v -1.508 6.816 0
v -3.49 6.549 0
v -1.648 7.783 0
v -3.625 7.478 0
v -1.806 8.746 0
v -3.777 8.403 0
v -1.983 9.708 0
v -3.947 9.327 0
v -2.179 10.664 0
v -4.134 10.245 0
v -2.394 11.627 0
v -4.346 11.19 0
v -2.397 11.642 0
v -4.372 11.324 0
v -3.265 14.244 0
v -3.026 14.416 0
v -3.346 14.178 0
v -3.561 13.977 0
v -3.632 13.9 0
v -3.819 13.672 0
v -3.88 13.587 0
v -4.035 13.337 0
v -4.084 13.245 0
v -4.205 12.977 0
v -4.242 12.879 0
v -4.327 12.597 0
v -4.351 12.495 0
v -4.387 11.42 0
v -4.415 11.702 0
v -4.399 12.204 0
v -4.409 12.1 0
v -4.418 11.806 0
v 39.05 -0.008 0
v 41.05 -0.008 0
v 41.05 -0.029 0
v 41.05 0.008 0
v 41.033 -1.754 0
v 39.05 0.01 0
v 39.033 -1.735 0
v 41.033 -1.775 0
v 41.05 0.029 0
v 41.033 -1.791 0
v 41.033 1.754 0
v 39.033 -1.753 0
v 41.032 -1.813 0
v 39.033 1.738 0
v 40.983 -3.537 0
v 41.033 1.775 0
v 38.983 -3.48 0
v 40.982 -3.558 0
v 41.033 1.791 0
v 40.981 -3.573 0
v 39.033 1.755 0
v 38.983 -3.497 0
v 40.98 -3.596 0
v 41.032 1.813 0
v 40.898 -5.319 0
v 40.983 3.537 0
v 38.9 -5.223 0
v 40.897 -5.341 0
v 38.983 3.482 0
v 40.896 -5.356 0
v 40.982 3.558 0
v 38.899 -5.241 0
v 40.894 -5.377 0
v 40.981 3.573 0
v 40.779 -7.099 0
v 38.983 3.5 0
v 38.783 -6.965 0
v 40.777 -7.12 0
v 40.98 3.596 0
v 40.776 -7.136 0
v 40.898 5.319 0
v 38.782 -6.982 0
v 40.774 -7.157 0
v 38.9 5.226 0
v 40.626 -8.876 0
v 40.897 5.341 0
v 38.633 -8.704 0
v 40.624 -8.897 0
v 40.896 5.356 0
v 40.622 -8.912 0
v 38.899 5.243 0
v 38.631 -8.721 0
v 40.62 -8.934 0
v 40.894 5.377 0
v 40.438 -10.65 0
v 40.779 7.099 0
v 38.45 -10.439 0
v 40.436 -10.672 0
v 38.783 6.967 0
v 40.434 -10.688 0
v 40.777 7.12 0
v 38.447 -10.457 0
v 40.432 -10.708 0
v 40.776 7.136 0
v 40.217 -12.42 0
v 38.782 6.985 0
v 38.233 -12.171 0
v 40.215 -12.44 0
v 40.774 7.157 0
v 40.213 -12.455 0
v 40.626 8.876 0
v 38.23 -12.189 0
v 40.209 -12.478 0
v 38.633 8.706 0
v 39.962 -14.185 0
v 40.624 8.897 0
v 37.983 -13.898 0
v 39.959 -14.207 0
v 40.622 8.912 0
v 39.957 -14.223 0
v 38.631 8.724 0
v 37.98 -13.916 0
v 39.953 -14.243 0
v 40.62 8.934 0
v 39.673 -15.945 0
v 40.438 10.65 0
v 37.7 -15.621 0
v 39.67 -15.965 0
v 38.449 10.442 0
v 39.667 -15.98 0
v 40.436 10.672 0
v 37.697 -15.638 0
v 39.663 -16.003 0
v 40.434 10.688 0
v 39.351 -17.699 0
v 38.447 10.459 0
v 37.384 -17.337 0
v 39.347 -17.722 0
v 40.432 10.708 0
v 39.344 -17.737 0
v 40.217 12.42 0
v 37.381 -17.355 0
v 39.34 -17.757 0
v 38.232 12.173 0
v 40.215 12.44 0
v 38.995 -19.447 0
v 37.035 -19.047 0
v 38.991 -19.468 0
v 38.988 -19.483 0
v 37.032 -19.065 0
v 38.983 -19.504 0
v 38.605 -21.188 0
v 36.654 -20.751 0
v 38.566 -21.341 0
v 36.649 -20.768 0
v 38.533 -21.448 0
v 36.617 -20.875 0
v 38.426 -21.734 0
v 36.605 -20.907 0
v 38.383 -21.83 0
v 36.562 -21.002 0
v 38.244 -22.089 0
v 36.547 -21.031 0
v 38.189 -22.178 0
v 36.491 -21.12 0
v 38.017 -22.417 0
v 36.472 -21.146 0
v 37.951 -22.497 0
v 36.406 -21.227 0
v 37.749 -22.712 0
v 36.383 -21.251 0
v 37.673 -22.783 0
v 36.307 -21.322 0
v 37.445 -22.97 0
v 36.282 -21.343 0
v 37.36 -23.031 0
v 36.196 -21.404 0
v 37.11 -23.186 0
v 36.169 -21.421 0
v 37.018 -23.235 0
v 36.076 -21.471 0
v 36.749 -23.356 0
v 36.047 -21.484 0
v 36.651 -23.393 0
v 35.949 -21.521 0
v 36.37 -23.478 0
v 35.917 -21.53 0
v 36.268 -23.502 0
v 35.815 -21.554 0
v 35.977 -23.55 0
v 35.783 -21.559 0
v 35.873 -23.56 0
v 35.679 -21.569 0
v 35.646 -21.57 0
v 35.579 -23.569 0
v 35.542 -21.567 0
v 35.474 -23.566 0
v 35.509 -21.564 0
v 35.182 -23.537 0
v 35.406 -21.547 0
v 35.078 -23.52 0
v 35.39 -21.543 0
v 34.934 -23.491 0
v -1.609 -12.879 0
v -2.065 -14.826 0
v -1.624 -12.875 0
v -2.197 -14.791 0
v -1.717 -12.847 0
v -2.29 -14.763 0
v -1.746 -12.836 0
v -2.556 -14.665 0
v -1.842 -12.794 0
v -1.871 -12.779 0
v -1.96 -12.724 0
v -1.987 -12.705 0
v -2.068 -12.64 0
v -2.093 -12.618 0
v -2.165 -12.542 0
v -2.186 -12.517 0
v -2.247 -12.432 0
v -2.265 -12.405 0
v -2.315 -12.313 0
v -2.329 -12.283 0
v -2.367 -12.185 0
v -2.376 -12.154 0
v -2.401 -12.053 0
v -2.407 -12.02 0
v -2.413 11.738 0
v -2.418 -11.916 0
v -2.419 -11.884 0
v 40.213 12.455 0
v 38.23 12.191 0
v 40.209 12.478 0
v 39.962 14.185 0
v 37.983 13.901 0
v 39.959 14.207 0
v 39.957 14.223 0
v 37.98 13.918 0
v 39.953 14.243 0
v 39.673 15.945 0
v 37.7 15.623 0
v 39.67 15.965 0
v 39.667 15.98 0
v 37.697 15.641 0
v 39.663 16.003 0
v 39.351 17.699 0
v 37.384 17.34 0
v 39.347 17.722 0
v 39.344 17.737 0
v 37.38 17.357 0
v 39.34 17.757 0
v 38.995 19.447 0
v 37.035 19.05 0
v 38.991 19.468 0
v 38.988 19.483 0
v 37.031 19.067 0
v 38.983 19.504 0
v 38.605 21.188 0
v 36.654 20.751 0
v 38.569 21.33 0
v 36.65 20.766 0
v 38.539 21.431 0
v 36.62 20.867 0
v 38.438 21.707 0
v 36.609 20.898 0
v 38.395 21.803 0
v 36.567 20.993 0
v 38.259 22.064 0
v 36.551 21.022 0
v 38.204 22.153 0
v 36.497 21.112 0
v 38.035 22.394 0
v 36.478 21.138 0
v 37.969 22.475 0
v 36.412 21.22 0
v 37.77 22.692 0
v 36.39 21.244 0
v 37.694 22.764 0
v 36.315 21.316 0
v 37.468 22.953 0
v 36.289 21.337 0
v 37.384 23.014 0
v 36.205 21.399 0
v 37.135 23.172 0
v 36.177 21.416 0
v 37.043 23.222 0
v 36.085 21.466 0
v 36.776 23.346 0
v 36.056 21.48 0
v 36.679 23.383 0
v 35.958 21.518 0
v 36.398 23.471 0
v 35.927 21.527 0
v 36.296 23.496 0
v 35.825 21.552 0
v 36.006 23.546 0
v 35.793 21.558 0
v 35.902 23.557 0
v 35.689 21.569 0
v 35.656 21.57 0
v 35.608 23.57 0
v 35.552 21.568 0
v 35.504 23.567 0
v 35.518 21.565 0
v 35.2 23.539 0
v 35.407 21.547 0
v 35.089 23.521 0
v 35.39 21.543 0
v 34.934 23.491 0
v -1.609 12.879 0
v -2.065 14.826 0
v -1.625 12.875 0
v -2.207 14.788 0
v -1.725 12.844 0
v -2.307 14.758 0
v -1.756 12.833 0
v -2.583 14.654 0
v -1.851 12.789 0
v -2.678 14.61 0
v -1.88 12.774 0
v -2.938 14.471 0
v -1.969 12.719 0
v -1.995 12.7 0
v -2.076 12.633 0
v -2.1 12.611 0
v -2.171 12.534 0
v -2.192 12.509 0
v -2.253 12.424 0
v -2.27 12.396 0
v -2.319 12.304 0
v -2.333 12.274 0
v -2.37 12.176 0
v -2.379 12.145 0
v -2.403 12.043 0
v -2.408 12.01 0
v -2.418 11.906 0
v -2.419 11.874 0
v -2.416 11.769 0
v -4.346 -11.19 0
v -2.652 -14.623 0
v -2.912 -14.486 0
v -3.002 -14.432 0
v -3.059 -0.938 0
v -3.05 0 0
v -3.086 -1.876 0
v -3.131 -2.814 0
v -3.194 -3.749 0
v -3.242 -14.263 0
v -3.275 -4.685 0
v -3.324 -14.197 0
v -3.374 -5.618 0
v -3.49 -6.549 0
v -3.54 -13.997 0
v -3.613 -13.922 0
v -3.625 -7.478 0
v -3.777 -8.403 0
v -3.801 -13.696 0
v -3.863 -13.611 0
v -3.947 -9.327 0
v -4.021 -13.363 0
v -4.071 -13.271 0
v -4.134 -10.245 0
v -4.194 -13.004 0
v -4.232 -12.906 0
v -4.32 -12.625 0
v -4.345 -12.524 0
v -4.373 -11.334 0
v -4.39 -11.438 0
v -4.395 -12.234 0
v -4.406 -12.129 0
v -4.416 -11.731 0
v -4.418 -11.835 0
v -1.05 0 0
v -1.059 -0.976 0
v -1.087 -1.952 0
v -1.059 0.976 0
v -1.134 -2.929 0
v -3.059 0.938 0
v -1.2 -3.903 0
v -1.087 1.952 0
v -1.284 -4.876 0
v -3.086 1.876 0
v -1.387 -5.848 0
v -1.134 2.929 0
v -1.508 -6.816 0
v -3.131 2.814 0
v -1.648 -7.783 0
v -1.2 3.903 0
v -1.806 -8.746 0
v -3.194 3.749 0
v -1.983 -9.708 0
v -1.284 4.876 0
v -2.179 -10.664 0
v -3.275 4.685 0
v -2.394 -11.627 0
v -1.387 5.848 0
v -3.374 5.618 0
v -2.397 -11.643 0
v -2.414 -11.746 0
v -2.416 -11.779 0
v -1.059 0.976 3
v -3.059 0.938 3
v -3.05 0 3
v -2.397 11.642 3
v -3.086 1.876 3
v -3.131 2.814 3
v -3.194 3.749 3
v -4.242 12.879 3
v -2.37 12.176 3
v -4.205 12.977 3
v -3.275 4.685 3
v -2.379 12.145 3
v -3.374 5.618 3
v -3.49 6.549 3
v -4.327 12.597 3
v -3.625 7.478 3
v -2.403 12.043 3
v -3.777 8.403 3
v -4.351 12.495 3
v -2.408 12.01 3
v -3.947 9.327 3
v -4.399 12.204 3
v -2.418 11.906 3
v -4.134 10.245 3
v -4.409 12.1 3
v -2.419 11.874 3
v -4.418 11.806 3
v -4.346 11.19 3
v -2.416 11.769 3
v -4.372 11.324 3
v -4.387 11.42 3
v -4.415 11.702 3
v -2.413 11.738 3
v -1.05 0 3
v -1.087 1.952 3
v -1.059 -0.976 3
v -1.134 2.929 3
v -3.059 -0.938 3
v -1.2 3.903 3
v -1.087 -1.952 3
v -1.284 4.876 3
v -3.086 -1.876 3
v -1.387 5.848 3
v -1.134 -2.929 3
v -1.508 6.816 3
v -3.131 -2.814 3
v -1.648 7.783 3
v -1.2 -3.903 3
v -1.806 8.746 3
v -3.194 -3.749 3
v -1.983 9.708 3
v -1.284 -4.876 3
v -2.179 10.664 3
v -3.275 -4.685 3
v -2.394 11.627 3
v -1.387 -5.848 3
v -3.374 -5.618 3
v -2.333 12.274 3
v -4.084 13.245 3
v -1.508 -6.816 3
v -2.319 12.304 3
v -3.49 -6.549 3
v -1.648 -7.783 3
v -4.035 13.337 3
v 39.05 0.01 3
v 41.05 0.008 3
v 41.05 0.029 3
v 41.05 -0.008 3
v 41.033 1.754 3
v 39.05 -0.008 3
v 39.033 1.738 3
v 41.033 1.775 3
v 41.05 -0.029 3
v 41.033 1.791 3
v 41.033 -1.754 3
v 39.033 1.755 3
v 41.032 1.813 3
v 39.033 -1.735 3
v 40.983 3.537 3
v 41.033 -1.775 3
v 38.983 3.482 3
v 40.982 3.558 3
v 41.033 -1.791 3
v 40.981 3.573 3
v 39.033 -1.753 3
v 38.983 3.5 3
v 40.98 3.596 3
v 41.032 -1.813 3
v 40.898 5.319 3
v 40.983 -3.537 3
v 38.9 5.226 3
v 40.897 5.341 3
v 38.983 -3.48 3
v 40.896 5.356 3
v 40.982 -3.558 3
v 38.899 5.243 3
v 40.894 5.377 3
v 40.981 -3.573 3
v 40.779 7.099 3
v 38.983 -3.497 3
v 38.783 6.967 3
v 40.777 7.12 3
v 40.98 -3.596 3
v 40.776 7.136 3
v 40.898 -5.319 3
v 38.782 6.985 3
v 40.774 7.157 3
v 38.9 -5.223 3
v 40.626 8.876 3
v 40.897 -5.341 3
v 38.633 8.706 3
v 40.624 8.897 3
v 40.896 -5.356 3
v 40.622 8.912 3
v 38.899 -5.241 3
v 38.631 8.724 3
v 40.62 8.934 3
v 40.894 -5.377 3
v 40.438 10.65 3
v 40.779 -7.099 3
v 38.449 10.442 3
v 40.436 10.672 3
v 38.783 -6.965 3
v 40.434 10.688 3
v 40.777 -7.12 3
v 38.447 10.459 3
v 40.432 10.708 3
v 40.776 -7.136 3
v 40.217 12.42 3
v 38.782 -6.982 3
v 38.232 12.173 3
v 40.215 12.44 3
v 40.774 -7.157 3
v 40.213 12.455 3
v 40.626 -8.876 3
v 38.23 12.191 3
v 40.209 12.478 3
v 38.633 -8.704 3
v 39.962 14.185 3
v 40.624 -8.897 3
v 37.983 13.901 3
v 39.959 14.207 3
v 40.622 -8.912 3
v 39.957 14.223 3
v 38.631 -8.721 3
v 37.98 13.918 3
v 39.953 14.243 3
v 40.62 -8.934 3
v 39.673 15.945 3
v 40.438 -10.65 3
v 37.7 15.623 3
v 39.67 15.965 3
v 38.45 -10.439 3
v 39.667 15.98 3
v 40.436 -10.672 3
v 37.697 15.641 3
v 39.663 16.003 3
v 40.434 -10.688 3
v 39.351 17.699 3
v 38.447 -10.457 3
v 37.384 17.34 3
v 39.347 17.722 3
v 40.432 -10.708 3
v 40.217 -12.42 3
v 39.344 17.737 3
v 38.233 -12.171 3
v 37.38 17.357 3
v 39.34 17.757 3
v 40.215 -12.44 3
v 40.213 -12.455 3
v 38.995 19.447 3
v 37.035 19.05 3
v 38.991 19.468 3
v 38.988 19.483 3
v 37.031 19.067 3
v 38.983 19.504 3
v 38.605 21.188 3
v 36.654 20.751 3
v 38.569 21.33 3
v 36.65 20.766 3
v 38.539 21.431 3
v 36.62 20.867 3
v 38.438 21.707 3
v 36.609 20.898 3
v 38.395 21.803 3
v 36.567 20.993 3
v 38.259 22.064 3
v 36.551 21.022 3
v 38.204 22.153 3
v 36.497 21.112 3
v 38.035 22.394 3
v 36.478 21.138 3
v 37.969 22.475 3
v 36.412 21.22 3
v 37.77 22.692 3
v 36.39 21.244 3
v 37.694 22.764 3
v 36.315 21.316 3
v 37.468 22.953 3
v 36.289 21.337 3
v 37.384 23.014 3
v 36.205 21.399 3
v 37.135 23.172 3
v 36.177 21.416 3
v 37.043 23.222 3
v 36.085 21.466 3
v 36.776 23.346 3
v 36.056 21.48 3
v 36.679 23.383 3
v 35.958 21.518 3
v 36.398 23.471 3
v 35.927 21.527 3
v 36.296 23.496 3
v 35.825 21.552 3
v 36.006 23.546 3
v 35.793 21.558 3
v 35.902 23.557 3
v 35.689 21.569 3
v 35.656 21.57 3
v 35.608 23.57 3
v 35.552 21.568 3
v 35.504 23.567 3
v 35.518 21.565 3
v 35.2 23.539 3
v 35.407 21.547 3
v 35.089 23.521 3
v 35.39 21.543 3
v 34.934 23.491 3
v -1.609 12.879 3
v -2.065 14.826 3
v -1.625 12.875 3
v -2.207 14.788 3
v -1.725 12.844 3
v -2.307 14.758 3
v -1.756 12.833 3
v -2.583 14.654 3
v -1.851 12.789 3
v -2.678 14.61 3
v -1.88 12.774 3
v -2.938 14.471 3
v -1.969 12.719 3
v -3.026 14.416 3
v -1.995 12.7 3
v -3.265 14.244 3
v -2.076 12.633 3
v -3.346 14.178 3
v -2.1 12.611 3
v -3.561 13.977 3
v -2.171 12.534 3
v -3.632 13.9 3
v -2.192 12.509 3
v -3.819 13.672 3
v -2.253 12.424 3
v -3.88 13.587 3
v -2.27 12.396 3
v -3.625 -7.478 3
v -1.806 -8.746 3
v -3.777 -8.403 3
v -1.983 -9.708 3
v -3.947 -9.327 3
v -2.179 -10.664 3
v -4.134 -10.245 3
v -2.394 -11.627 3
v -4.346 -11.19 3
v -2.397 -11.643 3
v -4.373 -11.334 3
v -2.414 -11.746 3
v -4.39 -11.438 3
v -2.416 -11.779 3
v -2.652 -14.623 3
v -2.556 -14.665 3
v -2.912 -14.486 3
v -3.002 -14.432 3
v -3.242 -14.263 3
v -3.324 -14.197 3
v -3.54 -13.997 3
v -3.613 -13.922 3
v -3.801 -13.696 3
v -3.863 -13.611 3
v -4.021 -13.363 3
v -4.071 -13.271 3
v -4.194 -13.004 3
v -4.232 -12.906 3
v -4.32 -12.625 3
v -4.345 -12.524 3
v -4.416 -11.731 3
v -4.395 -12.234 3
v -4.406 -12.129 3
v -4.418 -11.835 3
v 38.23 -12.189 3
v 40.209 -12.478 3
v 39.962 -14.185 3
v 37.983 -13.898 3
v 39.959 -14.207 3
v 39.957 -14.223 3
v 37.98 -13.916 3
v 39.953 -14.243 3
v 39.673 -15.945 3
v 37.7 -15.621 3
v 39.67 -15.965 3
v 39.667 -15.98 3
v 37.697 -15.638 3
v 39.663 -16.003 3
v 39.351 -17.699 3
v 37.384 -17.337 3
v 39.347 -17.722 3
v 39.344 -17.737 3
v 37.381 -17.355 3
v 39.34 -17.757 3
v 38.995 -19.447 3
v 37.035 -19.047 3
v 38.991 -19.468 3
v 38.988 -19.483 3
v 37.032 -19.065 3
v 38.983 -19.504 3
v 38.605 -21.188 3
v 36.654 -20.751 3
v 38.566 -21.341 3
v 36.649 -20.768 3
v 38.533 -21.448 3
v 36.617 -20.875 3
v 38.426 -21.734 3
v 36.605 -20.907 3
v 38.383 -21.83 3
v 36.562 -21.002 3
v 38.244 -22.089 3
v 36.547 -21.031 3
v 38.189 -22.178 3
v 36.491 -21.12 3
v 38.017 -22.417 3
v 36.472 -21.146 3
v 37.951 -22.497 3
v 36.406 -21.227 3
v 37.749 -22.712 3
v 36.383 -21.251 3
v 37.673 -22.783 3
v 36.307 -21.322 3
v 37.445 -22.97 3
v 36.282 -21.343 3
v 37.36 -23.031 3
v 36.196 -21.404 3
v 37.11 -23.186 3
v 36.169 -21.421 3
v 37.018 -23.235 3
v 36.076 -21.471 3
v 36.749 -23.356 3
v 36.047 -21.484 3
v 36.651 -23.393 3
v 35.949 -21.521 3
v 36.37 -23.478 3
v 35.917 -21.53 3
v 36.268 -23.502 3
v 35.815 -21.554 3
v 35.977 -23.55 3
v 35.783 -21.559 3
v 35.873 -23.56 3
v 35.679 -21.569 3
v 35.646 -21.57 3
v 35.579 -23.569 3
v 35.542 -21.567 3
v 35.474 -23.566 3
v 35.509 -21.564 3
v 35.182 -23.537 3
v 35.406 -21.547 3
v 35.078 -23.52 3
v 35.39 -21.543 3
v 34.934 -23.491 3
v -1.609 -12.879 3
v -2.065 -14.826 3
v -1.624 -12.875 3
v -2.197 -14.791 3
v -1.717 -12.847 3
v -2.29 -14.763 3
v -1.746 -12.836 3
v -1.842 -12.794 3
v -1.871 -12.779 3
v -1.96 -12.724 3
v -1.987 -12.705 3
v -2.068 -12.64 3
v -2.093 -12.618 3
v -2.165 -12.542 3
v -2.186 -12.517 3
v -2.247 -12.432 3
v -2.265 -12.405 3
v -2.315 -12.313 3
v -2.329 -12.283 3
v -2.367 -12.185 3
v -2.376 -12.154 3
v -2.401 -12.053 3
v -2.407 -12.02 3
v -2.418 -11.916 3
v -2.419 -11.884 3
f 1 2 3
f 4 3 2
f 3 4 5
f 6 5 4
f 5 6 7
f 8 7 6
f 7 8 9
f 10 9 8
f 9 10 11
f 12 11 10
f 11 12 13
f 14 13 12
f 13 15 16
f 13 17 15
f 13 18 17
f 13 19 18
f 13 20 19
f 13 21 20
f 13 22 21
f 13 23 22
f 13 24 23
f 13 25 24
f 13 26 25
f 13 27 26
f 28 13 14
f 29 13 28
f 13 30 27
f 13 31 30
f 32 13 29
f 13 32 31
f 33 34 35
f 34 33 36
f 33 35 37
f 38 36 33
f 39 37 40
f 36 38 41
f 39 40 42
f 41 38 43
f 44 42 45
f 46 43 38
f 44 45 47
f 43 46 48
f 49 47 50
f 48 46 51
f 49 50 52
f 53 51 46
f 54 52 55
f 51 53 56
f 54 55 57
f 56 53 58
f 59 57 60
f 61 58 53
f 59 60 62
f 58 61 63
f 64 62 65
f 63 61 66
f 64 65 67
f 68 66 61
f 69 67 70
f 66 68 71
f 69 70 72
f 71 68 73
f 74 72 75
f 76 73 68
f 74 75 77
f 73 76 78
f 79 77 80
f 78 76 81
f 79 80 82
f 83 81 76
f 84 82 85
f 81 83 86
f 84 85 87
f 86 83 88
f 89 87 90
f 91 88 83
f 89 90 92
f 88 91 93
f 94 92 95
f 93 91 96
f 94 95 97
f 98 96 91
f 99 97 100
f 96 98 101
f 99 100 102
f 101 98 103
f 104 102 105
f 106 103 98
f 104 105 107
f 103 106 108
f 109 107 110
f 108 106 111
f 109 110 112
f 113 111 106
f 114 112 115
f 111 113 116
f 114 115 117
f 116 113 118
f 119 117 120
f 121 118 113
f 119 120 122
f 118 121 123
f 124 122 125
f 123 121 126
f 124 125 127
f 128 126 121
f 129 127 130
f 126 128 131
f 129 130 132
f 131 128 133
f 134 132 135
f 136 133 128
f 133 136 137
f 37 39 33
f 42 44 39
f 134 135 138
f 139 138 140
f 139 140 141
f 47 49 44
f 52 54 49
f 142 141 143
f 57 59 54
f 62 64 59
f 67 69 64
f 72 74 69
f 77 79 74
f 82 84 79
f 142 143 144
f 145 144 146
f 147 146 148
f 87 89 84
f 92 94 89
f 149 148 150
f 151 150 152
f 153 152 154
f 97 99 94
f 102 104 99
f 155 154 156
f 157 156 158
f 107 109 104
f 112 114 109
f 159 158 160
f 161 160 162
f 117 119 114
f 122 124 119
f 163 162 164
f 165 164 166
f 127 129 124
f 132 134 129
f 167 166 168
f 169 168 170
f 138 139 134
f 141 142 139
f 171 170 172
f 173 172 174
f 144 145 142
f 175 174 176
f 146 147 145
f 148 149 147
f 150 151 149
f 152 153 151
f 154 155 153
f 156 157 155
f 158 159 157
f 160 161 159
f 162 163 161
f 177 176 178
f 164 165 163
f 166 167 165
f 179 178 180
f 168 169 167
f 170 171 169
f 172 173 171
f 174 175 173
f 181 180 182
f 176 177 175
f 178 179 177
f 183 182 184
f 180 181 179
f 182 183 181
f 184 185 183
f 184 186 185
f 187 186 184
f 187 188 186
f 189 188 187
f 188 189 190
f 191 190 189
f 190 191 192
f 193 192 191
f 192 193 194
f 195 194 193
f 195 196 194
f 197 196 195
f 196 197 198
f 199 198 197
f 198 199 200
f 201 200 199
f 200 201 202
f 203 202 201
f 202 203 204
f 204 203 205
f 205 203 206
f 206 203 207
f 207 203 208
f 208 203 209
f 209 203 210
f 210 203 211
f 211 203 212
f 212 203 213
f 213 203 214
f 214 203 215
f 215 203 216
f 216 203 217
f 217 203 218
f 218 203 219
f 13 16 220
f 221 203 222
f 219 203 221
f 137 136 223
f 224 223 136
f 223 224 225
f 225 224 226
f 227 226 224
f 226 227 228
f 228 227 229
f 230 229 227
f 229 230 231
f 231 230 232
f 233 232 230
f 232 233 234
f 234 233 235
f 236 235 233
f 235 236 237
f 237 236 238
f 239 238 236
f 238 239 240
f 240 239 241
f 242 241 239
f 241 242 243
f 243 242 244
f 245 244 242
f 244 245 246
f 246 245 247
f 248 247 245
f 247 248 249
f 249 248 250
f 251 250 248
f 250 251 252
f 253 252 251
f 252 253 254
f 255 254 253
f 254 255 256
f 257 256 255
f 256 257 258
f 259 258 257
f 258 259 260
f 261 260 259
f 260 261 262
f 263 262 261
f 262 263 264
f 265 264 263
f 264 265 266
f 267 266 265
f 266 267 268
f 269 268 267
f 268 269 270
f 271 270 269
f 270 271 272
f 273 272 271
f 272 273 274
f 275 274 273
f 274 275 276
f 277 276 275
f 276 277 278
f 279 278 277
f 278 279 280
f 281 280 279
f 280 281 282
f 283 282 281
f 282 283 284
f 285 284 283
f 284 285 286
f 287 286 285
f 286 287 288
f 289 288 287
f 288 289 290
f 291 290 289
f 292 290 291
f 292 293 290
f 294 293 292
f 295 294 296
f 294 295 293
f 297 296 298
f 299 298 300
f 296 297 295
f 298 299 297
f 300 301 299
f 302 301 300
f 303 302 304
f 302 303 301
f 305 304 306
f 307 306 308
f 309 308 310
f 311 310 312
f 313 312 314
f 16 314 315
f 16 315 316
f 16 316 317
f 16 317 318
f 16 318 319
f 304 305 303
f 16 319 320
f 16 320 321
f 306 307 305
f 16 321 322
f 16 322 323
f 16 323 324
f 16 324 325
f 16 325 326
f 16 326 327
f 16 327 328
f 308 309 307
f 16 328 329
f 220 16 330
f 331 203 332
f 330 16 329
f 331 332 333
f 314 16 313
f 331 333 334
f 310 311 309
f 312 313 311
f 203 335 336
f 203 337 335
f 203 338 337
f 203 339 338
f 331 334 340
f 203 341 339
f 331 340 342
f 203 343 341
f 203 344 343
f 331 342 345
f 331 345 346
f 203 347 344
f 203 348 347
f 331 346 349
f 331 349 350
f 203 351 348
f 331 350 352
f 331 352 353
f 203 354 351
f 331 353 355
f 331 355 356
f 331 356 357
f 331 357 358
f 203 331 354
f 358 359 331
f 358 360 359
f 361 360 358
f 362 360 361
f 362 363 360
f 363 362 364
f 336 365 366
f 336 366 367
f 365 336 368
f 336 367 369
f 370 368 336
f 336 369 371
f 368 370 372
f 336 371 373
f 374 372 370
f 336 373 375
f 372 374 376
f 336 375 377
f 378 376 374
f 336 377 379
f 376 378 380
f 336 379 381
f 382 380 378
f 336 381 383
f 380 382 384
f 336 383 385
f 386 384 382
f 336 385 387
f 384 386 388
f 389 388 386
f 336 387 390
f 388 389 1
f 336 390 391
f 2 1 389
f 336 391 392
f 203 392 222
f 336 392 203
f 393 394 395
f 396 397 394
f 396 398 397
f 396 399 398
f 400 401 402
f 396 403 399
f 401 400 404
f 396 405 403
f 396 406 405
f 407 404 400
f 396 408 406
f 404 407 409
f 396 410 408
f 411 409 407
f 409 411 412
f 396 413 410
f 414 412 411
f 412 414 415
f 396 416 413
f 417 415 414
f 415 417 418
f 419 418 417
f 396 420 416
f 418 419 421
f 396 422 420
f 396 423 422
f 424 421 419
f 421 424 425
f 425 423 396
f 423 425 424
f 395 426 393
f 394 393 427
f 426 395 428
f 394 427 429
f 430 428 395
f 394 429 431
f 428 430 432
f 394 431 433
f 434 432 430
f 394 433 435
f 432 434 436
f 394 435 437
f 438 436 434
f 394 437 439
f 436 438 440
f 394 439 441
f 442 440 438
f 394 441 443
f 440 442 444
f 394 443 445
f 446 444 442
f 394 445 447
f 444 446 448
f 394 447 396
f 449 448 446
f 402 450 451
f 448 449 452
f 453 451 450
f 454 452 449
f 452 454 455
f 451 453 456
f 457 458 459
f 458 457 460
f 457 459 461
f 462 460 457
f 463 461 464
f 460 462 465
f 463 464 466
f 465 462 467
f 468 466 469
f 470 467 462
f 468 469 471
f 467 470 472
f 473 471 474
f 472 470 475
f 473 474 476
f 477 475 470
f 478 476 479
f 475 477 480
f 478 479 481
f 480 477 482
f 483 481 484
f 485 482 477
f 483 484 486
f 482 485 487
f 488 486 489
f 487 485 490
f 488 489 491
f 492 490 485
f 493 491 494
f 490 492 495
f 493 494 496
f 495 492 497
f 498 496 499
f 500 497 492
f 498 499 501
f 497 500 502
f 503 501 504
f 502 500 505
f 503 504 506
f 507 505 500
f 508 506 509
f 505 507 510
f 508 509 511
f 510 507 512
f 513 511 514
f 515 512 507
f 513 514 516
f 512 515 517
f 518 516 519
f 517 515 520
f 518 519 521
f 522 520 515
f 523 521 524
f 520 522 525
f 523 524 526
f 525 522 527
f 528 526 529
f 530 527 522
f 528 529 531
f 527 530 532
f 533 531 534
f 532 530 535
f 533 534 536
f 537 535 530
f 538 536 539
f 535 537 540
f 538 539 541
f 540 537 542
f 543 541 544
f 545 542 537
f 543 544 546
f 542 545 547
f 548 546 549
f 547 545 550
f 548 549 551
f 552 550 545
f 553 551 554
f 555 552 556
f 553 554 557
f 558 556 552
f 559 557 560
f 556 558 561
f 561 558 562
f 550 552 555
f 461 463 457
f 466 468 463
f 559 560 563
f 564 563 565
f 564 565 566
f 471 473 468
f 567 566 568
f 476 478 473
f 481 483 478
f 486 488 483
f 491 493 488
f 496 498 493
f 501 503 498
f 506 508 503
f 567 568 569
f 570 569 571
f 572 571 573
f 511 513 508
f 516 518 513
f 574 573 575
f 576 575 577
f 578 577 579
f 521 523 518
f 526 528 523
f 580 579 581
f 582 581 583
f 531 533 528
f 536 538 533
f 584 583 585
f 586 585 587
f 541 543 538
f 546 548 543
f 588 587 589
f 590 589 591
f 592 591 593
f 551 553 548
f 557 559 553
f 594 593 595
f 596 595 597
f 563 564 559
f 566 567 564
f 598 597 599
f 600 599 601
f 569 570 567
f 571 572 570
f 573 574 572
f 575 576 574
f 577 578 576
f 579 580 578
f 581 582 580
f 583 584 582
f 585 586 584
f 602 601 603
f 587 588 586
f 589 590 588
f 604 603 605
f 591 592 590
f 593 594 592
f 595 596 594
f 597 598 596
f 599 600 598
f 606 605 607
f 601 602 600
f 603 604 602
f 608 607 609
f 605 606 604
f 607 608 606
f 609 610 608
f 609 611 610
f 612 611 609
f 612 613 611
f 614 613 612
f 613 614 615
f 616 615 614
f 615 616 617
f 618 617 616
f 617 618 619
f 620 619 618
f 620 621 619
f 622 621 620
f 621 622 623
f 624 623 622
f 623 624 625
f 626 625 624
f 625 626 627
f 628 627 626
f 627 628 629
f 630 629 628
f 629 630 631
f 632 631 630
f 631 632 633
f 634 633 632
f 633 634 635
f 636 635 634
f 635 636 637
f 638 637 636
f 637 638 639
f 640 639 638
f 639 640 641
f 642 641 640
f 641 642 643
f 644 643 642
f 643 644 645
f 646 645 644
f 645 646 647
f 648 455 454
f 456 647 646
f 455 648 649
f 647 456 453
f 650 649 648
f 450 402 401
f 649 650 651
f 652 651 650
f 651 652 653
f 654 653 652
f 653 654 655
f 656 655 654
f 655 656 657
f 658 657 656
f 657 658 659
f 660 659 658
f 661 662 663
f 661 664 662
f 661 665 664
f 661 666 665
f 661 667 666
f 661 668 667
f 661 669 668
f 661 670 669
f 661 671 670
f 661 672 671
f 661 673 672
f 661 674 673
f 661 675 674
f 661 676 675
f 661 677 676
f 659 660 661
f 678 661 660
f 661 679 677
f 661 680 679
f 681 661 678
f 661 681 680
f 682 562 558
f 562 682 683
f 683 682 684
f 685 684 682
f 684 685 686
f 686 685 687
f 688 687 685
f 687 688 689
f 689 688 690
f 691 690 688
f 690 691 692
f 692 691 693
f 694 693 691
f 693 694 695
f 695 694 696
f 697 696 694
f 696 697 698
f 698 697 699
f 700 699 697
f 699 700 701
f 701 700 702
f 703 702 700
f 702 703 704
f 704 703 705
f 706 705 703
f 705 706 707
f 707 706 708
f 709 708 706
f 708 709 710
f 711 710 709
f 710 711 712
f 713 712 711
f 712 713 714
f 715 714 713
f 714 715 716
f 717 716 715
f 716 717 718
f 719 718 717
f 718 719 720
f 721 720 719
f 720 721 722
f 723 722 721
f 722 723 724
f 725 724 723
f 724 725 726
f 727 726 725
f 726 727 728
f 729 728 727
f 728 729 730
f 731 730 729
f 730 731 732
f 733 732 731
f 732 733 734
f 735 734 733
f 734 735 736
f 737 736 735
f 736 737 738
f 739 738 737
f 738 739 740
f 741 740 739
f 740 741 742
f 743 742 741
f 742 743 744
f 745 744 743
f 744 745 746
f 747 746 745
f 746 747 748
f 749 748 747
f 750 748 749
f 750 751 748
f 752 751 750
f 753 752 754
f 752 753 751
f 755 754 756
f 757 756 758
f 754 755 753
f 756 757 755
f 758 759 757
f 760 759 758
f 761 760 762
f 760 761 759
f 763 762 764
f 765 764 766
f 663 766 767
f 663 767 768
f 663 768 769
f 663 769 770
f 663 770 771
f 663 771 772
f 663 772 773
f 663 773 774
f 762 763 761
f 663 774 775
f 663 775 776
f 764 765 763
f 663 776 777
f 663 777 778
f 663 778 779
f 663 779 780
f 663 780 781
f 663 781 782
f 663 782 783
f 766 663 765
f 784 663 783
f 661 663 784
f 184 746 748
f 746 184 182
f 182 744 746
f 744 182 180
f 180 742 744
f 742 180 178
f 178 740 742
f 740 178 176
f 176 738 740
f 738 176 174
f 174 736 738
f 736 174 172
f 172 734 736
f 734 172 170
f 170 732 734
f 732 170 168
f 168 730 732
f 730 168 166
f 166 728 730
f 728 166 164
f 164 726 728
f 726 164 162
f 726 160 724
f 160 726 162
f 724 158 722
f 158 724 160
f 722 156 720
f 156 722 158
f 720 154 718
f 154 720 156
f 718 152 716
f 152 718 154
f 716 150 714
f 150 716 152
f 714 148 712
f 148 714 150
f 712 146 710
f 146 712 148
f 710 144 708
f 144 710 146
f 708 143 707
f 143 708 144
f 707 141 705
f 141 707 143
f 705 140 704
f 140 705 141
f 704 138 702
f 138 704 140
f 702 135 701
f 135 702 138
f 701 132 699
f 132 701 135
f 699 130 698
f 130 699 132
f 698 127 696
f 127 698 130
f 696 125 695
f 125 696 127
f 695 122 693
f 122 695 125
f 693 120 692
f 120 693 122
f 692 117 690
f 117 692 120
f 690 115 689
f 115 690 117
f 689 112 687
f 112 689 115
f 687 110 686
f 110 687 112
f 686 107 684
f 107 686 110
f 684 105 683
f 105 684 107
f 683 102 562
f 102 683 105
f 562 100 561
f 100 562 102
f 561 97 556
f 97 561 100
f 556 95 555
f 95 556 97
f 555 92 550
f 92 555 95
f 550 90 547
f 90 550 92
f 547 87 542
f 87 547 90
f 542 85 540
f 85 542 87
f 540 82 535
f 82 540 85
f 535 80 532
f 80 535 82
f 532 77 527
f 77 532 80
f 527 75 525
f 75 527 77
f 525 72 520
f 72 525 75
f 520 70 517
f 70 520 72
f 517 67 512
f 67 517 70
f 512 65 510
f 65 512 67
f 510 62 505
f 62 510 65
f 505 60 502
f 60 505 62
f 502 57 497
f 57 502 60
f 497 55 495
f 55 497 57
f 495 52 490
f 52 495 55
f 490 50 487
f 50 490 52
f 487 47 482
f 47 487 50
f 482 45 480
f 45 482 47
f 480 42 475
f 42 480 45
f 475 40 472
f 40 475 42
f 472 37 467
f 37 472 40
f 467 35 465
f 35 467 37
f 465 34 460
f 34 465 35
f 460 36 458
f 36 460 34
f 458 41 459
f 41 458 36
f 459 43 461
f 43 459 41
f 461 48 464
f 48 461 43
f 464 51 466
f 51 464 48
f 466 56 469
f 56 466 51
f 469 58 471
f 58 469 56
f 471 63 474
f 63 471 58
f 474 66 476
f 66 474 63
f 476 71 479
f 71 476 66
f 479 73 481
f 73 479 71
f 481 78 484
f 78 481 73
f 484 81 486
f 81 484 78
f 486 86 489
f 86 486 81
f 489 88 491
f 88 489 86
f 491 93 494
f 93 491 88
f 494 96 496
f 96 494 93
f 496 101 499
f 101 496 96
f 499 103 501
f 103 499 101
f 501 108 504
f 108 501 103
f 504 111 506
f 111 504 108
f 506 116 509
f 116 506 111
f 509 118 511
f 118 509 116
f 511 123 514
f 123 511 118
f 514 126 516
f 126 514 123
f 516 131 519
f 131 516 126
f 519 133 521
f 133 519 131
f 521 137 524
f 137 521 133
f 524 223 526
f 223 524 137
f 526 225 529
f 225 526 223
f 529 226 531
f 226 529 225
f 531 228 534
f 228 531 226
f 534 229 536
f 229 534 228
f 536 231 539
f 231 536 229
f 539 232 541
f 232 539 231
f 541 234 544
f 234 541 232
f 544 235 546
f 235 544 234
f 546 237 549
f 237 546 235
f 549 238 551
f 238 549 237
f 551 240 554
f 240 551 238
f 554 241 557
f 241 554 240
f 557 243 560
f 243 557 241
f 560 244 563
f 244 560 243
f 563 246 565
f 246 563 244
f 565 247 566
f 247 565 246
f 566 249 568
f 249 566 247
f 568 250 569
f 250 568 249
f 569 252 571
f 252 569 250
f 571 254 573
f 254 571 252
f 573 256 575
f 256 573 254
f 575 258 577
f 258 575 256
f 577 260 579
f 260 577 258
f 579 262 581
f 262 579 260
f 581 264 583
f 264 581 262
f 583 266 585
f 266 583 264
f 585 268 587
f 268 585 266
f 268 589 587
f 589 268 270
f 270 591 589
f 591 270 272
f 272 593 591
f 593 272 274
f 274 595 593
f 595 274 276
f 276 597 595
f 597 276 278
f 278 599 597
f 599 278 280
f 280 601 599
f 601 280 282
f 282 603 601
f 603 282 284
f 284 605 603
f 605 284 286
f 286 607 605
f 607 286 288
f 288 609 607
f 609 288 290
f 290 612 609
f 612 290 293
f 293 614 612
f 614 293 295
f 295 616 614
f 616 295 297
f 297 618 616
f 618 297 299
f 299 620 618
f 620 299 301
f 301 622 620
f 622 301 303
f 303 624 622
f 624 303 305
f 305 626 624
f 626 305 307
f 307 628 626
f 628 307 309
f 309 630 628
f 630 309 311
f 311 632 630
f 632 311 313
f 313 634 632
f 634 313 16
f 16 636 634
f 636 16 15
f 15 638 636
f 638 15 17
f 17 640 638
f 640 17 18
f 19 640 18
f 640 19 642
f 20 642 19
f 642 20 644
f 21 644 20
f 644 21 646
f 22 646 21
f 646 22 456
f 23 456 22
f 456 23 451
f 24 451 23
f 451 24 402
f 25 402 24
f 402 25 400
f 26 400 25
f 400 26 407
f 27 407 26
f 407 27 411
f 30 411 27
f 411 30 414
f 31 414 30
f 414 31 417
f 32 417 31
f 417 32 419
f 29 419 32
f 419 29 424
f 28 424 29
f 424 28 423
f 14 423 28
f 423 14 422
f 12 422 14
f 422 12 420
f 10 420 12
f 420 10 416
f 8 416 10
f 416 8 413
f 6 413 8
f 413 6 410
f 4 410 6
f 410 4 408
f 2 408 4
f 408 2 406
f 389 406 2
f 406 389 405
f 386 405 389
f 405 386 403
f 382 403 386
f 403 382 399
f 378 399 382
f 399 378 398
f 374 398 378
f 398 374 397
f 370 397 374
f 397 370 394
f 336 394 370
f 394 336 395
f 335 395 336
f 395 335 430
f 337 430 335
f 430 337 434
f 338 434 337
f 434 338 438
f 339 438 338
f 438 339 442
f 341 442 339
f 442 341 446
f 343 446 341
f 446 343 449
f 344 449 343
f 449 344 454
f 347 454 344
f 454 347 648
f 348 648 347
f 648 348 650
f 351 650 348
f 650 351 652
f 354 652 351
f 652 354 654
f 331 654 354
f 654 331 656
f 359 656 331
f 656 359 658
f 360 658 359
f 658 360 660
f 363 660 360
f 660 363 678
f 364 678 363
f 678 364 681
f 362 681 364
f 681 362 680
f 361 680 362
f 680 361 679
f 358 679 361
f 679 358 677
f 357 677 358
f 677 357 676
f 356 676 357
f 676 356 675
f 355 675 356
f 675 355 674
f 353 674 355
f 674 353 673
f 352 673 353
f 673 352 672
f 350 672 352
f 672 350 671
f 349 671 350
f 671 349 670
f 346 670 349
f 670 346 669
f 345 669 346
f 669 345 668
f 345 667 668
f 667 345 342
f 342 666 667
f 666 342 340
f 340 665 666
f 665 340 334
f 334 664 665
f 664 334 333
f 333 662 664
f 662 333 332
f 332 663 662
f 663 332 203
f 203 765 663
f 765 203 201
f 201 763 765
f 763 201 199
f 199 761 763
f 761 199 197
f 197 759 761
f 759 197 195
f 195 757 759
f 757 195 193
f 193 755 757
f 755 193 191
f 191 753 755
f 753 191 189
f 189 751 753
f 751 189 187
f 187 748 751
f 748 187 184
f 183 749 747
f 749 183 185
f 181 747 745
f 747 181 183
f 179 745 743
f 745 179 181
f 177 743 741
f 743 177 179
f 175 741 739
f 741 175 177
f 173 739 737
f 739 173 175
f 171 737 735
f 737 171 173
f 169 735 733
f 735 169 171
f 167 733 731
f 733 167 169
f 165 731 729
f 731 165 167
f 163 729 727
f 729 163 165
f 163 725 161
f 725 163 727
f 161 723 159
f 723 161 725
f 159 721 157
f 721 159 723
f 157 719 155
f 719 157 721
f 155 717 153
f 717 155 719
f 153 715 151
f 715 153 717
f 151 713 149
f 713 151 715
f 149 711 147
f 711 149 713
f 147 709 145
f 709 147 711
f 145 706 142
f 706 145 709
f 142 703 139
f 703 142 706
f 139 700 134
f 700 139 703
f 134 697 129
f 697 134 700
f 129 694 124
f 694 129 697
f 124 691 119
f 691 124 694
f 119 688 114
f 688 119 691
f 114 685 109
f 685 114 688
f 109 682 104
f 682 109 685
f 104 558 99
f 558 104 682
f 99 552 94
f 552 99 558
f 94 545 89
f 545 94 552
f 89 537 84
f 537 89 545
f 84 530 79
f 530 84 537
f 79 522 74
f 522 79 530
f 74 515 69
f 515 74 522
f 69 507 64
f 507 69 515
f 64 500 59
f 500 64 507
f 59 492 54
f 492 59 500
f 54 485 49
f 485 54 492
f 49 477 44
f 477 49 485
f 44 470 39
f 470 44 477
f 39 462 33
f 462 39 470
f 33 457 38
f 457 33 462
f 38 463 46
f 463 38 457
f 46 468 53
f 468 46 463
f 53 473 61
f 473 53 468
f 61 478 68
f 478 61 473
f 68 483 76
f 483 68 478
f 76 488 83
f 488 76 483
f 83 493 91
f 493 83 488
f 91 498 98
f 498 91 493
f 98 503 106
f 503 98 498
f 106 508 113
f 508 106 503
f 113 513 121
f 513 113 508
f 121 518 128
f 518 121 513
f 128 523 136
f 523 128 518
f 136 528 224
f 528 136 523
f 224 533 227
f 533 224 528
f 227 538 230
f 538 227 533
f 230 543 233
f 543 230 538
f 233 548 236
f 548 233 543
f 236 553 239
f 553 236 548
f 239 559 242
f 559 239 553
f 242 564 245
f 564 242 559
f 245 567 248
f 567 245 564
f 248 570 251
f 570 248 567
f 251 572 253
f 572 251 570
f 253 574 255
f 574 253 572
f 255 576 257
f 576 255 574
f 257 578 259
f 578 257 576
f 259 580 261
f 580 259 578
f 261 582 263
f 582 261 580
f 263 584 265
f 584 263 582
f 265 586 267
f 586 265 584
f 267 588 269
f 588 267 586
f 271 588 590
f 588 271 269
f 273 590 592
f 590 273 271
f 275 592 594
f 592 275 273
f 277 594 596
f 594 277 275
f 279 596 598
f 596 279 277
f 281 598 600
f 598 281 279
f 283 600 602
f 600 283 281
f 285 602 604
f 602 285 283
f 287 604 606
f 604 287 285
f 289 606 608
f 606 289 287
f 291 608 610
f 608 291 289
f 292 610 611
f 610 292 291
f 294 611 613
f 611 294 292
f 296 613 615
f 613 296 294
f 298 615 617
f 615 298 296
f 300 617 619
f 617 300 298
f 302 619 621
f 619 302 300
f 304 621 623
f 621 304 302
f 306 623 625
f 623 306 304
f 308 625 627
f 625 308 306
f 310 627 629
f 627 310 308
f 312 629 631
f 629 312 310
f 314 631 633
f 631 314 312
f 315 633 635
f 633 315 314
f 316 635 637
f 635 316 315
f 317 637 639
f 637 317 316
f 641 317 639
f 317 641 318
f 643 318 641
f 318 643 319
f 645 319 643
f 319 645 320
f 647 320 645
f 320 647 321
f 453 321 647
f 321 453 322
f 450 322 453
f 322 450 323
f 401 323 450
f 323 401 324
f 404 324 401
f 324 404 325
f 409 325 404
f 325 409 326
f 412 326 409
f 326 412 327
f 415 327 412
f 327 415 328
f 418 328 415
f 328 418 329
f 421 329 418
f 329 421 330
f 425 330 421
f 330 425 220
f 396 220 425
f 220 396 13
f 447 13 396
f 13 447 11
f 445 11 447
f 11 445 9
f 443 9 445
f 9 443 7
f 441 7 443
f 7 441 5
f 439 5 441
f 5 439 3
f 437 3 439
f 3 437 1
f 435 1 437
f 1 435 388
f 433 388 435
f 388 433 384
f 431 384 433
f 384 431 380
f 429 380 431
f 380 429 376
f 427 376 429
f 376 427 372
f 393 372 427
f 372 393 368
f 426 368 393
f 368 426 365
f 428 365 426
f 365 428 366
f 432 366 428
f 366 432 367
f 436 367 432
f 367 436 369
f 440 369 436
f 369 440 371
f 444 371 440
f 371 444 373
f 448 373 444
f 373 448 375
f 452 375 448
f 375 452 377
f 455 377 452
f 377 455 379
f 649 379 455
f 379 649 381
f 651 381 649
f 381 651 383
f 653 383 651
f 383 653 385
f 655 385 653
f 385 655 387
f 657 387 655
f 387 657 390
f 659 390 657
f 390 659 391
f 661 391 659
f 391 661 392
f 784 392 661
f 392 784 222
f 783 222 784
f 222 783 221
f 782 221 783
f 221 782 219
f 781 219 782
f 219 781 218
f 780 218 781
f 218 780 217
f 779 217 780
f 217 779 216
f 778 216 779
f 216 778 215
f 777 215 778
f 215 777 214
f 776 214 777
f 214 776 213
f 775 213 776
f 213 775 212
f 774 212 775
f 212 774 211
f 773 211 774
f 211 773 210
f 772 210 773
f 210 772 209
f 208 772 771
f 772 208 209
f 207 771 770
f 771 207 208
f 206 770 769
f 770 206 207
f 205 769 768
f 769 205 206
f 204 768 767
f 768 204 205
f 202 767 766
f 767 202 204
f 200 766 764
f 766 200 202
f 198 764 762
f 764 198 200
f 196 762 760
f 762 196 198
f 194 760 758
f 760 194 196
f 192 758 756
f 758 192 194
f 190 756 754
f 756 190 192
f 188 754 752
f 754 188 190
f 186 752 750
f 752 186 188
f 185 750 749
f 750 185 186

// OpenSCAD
// file: parameters.scad
// =============================================================================
// Gen-CC — nightly 2026-10-13 (physics_scorer, honest magpylib watts)
// Stator-only upgrade for an existing Gen-BX: the R71 rotors and Ø168 steel stay as they are; a new annular 12-bobbin stator with 6.3 mm copper (magnet gap 9.35 → 8.90 mm) and longer r52–90 bobbins (the open-centre stator now packs one size up) replaces the old one, together with a shorter gap sleeve, frame rods moved out to R93.5 and new bearing bridges. No new magnets or steel.
// Clocking 0 deg (magnets N facing S) + D-flat keyed bore + index notch + flip-symmetric hole map.
// Windable 2-piece bobbin; turns = physics_scorer turns_fit; copper only between flanges.
// Steel back-iron: 2× Ø168 × 4.76 mm (3/16") mild-steel discs (steel_backiron_disc.dxf); magnets sit ON the steel
// (through-pockets) -> score with --back-iron. Night 2026-10-13.
// =============================================================================
topology            = "dual_rotor";

// --- Wire / winding (physics_scorer winding-fit) -------------------------------
wire_awg            = 26;
wire_od             = 0.45;     // insulated OD mm (bare 0.405)
fill_realistic      = 0.65;     // insulated-wire area / window (DENSE layered wind with a jig; scorer cap 0.65)
turns               = 391;       // = physics_scorer turns_fit (do NOT raise)
coil_former_type    = "bobbin";
coil_core_inset     = 15.20;     // radial copper build: hub = copper boundary inset by this
wind_build_axial    = 0.0;      // nothing proud of the flanges
wind_build_radial   = 0.0;

// --- Bobbin (base + lid) ---------------------------------------------------------
coil_id_r           = 52.00;    // copper boundary sector
coil_od_r           = 90.00;
span_deg            = 26.36;    // = pitch - 2*asin((wall+0.85)/coil_id_r) -> >=1.2 mm stator web
former_web          = 6.30;     // copper height between flanges (TALL copper: steel keeps Bz up)
flange_t            = 0.80;     // >= 0.8 mm FDM wall rule (tall winds push on the flanges)
wall                = 0.80;     // flange lip beyond copper
former_bare_h       = former_web + 2 * flange_t;
coil_envelope_h     = former_bare_h + 2 * wind_build_axial;
tab_w               = 7.0;
tab_len             = 7.0;
tab_h               = former_bare_h / 2;
pin_d               = 1.9;      // 1.75 mm filament locating pin
coil_mount_r        = coil_od_r + 0.2 + 4.0;
lead_y              = 1.6;
lead_slot_w         = 0.9;
lead_groove_d       = 0.6;

// --- Gap -------------------------------------------------------------------------
run_clear           = 0.50;     // rotor face -> flange
gap_spacer_h        = run_clear + wind_build_axial;
m2m                 = coil_envelope_h + 2 * run_clear;   // rotor face to rotor face (= gap_sleeve length)

// --- Stator ----------------------------------------------------------------------
coil_stations       = 12;
bay_clear           = 0.25;
stator_thick        = former_bare_h;                        // bobbins flush both faces
stator_od           = 198;
shaft_clear_stator  = 14.0;     // stator is static; gap sleeve OD 12 spins inside
stator_ir           = 46.95;    // ANNULAR stator: open centre (nested one-plate pack); inner rim 4.0 mm

// --- Rotor(s) --------------------------------------------------------------------
magnet_Br           = 1.43;     // N52
magnet_d_large      = 20.0;
magnet_h_large      = 5.0;      // one O20x5 per pocket
magnet_h_small      = 5.0;      // unused: no O5 pockets in this kit
halbach_magnetisation = "none";  // NO O5 assist magnets in this kit (scan: they lower the 4-pole score)
rotor_b_same_axis   = true;     // same-index magnets share one axis: N faces S across the gap
large_pocket_d      = 20.3;
small_pocket_d      = 5.3;
pocket_h            = 5.00;     // THROUGH the carrier: magnet back face sits on the steel disc (FLUSH seat: carrier = magnet height, magnet face level with the rotor face)
large_n             = 8;
R_large             = 71.0;
small_r_list        = [];       // no O5 pockets
carrier_od          = 168.0;
carrier_thick       = pocket_h;
hub_h               = 12.0;     // > steel_t + insert: radial set-screw clears the steel
hub_od              = 24.0;     // slim hub so the M4 brace rods fit at R~18 inside the coil ring
hub_insert_d        = 4.0;      // M3 heat-set insert, radial, bears on the D-flat
rotor_b_offset_deg  = 0.0;      // CLOCKING: magnets directly opposite
shaft_key           = "dflat";
dflat_depth         = 0.5;      // 8 mm shaft with 0.5 mm flat (7.5 across flat)
index_notch_d       = 3.0;

// --- Steel back-iron (buyable laser-cut) -------------------------------------------
steel_t             = 4.76;      // mild steel thickness (image method ignores it; sized from steel_flux.py so the return path stays well below saturation)
steel_center_hole   = 26.0;     // slips over the rotor hub (OD 24)
steel_od            = carrier_od;   // steel disc OD = rotor carrier OD

// --- Modular MAX interface ----------------------------------------------------------
shaft_bore          = 8.35;
dflat_x             = 4.0 - dflat_depth + (shaft_bore - 8.0) / 2;
bearing_d           = 21.85;
bearing_h           = 7.2;
m3_clear            = 3.5;
bolt_r_inner        = 30.0;     // M3 steel-disc clamp bolts (inside the magnet ring)
bolt_n_inner        = 4;
bolt_inner_angles   = [0, 90, 180, 270];
bolt_r_outer        = 44.0;     // second M3 steel-disc clamp ring
bolt_outer_angles   = [67.5, 112.5, 247.5, 292.5];
flange_bolt_r       = 93.5;     // frame rods: OUTSIDE the rotor OD (rotors spin inside them)
flange_bolt_n       = 4;
flange_bolt_offset  = 45.00;    // between coil stations -> never cuts a lead groove/tab
brace_r             = 18.0;
brace_d             = 4.3;      // temporary M4 jack rods (assembly only)
brace_n             = 4;
brace_angles        = [45, 135, 225, 315];          // flip-symmetric

spacer_pad_od       = 14.0;
spacer_pad_id       = m3_clear;
endbell_od          = 197.0;
endbell_thick       = 8.0;
endbell_shaft_clear = 10.0;
collar_h            = 10.0;
standoff_od         = 9.0;
frame_standoff_h    = run_clear + carrier_thick + hub_h + collar_h + 2.0;
sleeve_od           = 12.0;
plate_max_mm        = 410;

$fn = 64;
// main file
// Gen-CC — fit coupon (bay part): O20/O5 THROUGH pockets at carrier thickness (test on a steel offcut), 608 seat,
// D-flat bore, gap shim, and one bobbin-bay slice (bobbin footprint + bay_clear) to test former fit.
include <parameters.scad>;
$fn = 48;
// D-flat keyed bore: flat faces +X (angle 0 = magnet pocket 0 = index notch)
module dflat_bore(h) {
    intersection() {
        cylinder(d=shaft_bore, h=h);
        translate([-shaft_bore, -shaft_bore, 0]) cube([shaft_bore + dflat_x, 2*shaft_bore, h]);
    }
}
module sector_2d(r_in, r_out, ang) {
    polygon([
        for (a = [-ang/2 : ang/24 : ang/2]) [r_in*cos(a), r_in*sin(a)],
        for (a = [ang/2 : -ang/24 : -ang/2]) [r_out*cos(a), r_out*sin(a)]
    ]);
}
module footprint_2d() { offset(r=wall) sector_2d(coil_id_r, coil_od_r, span_deg); }
module hub_2d()       { offset(delta=-coil_core_inset) sector_2d(coil_id_r, coil_od_r, span_deg); }

// bay slice: 3 mm tall ring section of the stator bay around one footprint (tests bobbin drop-in fit)
translate([-coil_id_r, 0, 0]) difference() {
    linear_extrude(3) offset(r=bay_clear + 2) footprint_2d();
    translate([0, 0, -0.1]) linear_extrude(3.2) offset(r=bay_clear) footprint_2d();
}
